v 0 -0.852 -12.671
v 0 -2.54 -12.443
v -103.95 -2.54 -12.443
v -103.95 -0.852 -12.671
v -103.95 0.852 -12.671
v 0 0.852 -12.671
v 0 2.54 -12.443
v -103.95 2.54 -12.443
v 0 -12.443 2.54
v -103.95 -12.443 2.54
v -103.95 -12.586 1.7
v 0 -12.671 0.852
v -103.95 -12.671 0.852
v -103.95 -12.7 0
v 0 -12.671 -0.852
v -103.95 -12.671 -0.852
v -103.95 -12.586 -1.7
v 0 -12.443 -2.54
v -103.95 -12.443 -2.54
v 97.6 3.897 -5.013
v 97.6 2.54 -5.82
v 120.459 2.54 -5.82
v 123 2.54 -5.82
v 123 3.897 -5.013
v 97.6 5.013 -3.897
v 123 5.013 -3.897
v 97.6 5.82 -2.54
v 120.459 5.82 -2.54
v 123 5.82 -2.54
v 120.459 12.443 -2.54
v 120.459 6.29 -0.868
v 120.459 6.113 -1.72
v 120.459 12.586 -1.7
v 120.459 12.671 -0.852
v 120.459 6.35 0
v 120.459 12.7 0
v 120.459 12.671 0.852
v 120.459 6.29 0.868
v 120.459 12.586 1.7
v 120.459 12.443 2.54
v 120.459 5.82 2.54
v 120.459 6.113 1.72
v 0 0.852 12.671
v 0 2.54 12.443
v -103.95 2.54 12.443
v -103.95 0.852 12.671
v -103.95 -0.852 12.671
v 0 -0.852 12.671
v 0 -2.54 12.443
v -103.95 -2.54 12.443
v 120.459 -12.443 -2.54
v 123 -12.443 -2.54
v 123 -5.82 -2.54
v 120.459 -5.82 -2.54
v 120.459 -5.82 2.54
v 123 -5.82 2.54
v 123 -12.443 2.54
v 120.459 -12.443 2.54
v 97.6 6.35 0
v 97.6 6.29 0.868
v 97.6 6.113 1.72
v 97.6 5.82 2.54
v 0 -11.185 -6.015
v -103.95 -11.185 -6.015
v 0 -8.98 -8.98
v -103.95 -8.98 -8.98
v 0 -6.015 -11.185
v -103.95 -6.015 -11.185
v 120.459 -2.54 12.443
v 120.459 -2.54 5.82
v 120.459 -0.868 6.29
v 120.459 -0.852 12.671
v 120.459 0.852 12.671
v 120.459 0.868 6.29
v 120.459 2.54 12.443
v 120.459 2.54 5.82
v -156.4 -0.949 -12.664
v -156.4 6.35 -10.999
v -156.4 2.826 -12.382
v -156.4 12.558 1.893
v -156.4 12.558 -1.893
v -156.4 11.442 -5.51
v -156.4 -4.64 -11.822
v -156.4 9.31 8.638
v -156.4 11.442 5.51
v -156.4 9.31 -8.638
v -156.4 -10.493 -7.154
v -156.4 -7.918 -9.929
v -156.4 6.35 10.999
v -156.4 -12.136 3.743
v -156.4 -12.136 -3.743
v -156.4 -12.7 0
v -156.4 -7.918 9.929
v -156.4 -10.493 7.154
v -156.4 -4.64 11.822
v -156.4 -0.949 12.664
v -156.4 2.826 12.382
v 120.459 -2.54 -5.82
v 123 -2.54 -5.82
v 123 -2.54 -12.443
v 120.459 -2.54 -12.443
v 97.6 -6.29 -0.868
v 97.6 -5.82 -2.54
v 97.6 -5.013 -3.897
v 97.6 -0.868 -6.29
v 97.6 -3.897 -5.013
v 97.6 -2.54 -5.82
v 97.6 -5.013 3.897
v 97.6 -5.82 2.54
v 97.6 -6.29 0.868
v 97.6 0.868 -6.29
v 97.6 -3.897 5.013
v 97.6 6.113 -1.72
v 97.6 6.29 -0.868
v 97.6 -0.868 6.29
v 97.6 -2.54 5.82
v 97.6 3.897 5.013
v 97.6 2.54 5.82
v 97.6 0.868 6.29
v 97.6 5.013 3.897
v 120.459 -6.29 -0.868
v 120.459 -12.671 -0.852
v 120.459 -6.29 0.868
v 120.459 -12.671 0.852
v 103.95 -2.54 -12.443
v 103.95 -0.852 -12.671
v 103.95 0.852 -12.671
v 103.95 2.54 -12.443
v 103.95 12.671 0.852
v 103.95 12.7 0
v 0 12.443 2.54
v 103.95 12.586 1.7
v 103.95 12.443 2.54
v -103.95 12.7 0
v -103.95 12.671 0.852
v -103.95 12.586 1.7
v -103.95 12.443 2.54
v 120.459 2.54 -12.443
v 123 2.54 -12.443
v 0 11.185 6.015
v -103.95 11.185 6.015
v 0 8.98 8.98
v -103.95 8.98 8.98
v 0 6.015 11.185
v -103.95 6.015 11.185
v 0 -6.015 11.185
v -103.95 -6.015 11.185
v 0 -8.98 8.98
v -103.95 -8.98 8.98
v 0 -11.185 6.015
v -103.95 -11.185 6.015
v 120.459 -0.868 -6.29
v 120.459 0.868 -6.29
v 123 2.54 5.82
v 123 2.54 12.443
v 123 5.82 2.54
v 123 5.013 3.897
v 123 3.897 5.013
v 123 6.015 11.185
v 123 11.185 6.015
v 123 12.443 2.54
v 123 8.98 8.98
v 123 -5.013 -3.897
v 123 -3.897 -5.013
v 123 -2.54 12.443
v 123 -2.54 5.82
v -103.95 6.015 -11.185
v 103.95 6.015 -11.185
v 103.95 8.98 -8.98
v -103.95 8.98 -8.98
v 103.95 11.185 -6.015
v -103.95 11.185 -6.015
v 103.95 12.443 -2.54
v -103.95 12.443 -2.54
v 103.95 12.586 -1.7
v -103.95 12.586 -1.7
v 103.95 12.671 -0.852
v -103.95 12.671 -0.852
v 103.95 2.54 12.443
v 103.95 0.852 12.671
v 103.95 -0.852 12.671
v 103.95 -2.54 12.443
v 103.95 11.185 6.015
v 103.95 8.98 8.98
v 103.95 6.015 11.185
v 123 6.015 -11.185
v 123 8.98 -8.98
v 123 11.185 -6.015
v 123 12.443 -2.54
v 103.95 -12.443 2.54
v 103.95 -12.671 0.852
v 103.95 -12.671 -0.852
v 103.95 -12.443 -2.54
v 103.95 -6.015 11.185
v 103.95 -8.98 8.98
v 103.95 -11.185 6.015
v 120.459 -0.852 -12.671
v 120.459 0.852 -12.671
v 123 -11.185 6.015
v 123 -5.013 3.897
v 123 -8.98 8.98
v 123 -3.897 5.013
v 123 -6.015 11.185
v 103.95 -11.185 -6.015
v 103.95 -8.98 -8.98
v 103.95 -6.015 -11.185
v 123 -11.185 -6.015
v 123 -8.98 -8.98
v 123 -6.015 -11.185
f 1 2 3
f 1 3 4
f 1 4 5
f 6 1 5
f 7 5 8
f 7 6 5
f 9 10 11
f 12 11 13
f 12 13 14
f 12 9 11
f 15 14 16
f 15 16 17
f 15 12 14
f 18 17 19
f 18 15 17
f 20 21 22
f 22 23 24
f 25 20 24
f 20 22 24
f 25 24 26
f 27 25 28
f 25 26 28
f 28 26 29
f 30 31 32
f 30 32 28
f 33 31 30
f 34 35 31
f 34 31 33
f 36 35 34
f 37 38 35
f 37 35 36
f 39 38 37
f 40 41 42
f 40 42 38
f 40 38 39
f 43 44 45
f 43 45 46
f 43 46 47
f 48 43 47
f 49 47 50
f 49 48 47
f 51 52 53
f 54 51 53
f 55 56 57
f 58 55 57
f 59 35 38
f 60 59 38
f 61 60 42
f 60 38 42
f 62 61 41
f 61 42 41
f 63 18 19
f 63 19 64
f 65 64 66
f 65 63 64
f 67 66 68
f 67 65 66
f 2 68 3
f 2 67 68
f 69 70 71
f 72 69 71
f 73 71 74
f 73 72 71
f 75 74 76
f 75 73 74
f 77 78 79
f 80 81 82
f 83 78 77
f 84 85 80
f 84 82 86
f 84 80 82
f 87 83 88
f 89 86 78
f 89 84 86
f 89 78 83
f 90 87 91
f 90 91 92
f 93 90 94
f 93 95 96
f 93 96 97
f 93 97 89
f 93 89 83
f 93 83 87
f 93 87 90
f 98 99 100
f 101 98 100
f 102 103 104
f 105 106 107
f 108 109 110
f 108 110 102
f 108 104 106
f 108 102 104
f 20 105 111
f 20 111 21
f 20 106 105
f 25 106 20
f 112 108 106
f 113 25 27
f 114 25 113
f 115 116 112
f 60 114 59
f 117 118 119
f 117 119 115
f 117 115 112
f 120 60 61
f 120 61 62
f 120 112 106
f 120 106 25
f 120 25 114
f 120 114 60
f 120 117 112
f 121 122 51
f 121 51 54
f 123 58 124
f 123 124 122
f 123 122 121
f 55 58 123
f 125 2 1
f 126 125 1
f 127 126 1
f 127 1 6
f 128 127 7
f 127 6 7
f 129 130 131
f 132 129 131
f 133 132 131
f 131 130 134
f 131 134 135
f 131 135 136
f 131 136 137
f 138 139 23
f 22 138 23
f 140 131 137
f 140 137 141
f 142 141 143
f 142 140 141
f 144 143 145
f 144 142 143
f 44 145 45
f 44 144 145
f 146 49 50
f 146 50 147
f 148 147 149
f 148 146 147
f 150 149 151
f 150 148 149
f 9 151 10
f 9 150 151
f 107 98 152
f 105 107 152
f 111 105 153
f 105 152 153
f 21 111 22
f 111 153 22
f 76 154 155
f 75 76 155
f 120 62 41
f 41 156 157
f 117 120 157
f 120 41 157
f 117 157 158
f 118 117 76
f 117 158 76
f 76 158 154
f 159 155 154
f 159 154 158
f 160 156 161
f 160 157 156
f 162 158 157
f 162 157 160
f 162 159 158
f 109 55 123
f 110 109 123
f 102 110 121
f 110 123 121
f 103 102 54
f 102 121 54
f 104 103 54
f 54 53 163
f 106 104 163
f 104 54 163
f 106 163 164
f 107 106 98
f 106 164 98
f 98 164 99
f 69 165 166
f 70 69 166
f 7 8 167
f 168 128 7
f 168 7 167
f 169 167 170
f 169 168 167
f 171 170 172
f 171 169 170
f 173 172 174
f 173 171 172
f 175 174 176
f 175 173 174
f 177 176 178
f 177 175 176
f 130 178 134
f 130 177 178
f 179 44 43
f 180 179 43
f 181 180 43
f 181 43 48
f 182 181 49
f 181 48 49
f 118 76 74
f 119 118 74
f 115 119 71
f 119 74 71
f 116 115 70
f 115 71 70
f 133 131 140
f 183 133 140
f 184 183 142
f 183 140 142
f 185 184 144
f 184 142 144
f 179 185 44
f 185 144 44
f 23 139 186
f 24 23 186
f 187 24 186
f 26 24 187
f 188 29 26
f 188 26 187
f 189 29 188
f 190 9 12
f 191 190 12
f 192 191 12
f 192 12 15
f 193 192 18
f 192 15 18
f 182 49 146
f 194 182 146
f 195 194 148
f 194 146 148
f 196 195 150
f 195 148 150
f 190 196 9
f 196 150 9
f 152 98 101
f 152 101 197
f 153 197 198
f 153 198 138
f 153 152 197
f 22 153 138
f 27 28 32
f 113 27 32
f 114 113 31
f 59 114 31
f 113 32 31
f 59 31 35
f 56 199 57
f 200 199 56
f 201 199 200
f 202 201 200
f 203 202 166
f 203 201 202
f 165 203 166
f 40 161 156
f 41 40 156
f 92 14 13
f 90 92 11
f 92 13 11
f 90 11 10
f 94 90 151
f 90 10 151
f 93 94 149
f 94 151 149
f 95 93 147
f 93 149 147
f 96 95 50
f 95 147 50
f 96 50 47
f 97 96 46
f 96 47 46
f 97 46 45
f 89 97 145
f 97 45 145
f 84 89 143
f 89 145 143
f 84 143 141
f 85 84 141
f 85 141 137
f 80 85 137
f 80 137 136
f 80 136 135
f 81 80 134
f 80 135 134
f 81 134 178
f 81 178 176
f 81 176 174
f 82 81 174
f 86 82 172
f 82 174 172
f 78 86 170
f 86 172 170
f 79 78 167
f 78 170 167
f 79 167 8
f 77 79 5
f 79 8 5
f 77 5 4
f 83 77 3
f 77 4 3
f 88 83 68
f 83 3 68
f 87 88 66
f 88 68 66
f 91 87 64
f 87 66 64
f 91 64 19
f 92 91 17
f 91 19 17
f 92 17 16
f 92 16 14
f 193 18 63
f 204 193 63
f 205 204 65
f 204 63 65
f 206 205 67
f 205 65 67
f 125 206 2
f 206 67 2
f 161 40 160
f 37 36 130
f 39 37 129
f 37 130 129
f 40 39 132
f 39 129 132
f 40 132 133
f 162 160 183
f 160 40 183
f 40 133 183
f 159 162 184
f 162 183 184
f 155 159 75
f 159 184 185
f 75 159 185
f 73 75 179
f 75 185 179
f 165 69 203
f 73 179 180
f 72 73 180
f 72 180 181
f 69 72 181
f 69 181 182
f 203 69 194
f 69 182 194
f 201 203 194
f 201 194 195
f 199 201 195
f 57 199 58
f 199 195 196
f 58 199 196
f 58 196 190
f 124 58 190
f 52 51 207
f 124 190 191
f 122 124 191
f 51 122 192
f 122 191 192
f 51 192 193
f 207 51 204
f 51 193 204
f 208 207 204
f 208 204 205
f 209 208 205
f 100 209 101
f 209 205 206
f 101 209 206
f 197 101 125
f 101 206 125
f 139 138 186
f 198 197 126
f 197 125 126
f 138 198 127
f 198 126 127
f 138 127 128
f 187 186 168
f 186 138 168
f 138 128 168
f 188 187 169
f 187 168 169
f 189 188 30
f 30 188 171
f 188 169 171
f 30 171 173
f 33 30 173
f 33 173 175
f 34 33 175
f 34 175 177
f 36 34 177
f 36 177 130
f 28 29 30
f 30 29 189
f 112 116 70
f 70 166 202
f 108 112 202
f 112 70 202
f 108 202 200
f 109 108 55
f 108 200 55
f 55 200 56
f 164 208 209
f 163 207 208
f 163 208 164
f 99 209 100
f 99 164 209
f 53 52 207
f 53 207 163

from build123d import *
from build123d import SkipClean  # not in build123d's __all__

# Parameters (mm, degrees)
F1_DEPTH  = 103.9495
F3_R      = 12.7
F4_DEPTH  = 19.05
F6_DEPTH  = 25.4
F8_DEPTH  = 2.54
F9_R      = 12.7
F10_DEPTH = 52.451


# Not quite as in the source:
# - after a boolean that leaves OpenCascade's solid faulty, fix() repairs it


with BuildPart() as f1:
    # F0 (on Right) → F1 (new body, symmetric)
    with BuildSketch(Plane.YZ):
        with BuildLine():
            ThreePointArc((12.4434078933, -2.54), (12.6356891432, -1.2764638175), (12.7, 0))
            ThreePointArc((12.7, 0), (12.6356891432, 1.2764638175), (12.4434078933, 2.54))
            Line((12.4434078933, 2.54), (5.8198711326, 2.54))
            ThreePointArc((5.8198711326, 2.54), (6.2160550871, 1.2973662374), (6.35, 0))
            ThreePointArc((6.35, 0), (6.2160550871, -1.2973662374), (5.8198711326, -2.54))
            Line((5.8198711326, -2.54), (12.4434078933, -2.54))
        make_face()
        with BuildLine():
            Line((5.8198711326, 2.54), (12.4434078933, 2.54))
            ThreePointArc((12.4434078933, 2.54), (8.9802561211, 8.9802561211), (2.54, 12.4434078933))
            Line((2.54, 12.4434078933), (2.54, 5.8198711326))
            ThreePointArc((2.54, 5.8198711326), (4.4901280605, 4.4901280605), (5.8198711326, 2.54))
        make_face()
        with BuildLine():
            ThreePointArc((2.54, -12.4434078933), (8.9802561211, -8.9802561211), (12.4434078933, -2.54))
            Line((12.4434078933, -2.54), (5.8198711326, -2.54))
            ThreePointArc((5.8198711326, -2.54), (4.4901280605, -4.4901280605), (2.54, -5.8198711326))
            Line((2.54, -5.8198711326), (2.54, -12.4434078933))
        make_face()
        with BuildLine():
            Line((2.54, 5.8198711326), (2.54, 12.4434078933))
            ThreePointArc((2.54, 12.4434078933), (0, 12.7), (-2.54, 12.4434078933))
            Line((-2.54, 12.4434078933), (-2.54, 5.8198711326))
            ThreePointArc((-2.54, 5.8198711326), (0, 6.35), (2.54, 5.8198711326))
        make_face()
        with BuildLine():
            ThreePointArc((-2.54, -12.4434078933), (0, -12.7), (2.54, -12.4434078933))
            Line((2.54, -12.4434078933), (2.54, -5.8198711326))
            ThreePointArc((2.54, -5.8198711326), (0, -6.35), (-2.54, -5.8198711326))
            Line((-2.54, -5.8198711326), (-2.54, -12.4434078933))
        make_face()
        with BuildLine():
            Line((-2.54, 5.8198711326), (-2.54, 12.4434078933))
            ThreePointArc((-2.54, 12.4434078933), (-8.9802561211, 8.9802561211), (-12.4434078933, 2.54))
            Line((-12.4434078933, 2.54), (-5.8198711326, 2.54))
            ThreePointArc((-5.8198711326, 2.54), (-4.4901280605, 4.4901280605), (-2.54, 5.8198711326))
        make_face()
        with BuildLine():
            ThreePointArc((-12.4434078933, -2.54), (-8.9802561211, -8.9802561211), (-2.54, -12.4434078933))
            Line((-2.54, -12.4434078933), (-2.54, -5.8198711326))
            ThreePointArc((-2.54, -5.8198711326), (-4.4901280605, -4.4901280605), (-5.8198711326, -2.54))
            Line((-5.8198711326, -2.54), (-12.4434078933, -2.54))
        make_face()
        with BuildLine():
            Line((-5.8198711326, 2.54), (-12.4434078933, 2.54))
            ThreePointArc((-12.4434078933, 2.54), (-12.7, 0), (-12.4434078933, -2.54))
            Line((-12.4434078933, -2.54), (-5.8198711326, -2.54))
            ThreePointArc((-5.8198711326, -2.54), (-6.35, 0), (-5.8198711326, 2.54))
        make_face()
        with BuildLine():
            ThreePointArc((6.35, 0), (6.2160550871, 1.2973662374), (5.8198711326, 2.54))
            ThreePointArc((5.8198711326, 2.54), (4.4901280605, 4.4901280605), (2.54, 5.8198711326))
            ThreePointArc((2.54, 5.8198711326), (0, 6.35), (-2.54, 5.8198711326))
            ThreePointArc((-2.54, 5.8198711326), (-4.4901280605, 4.4901280605), (-5.8198711326, 2.54))
            ThreePointArc((-5.8198711326, 2.54), (-6.35, 0), (-5.8198711326, -2.54))
            ThreePointArc((-5.8198711326, -2.54), (-4.4901280605, -4.4901280605), (-2.54, -5.8198711326))
            ThreePointArc((-2.54, -5.8198711326), (0, -6.35), (2.54, -5.8198711326))
            ThreePointArc((2.54, -5.8198711326), (4.4901280605, -4.4901280605), (5.8198711326, -2.54))
            ThreePointArc((5.8198711326, -2.54), (6.2160550871, -1.2973662374), (6.35, 0))
        make_face()
    extrude(amount=F1_DEPTH, both=True)

    # F3 (on face) → F4 (join)
    with BuildSketch(Plane.YZ.offset(103.9495)):
        Circle(F3_R)
    with SkipClean():  # cleaning this boolean's faces spoils the solid; the shape is the same uncleaned
        extrude(amount=F4_DEPTH)

    # F5 (on face) → F6 (cut)
    with BuildSketch(Plane.YZ.offset(122.9995)):
        with BuildLine():
            ThreePointArc((5.8198711326, -2.54), (6.2160550871, -1.2973662374), (6.35, 0))
            ThreePointArc((6.35, 0), (6.2160550871, 1.2973662374), (5.8198711326, 2.54))
            ThreePointArc((5.8198711326, 2.54), (4.4901280605, 4.4901280605), (2.54, 5.8198711326))
            ThreePointArc((2.54, 5.8198711326), (0, 6.35), (-2.54, 5.8198711326))
            ThreePointArc((-2.54, 5.8198711326), (-4.4901280605, 4.4901280605), (-5.8198711326, 2.54))
            ThreePointArc((-5.8198711326, 2.54), (-6.35, 0), (-5.8198711326, -2.54))
            ThreePointArc((-5.8198711326, -2.54), (-4.4901280605, -4.4901280605), (-2.54, -5.8198711326))
            ThreePointArc((-2.54, -5.8198711326), (0, -6.35), (2.54, -5.8198711326))
            ThreePointArc((2.54, -5.8198711326), (4.4901280605, -4.4901280605), (5.8198711326, -2.54))
        make_face()
    extrude(amount=-F6_DEPTH, mode=Mode.SUBTRACT)

    add(f1.part.fix(), mode=Mode.REPLACE)

    # F7 (on face) → F8 (cut)
    with BuildSketch(Plane.YZ.offset(122.9995)):
        with BuildLine():
            ThreePointArc((2.54, 12.4434078933), (0, 12.7), (-2.54, 12.4434078933))
            Line((-2.54, 12.4434078933), (-2.54, 5.8198711326))
            ThreePointArc((-2.54, 5.8198711326), (0, 6.35), (2.54, 5.8198711326))
            Line((2.54, 5.8198711326), (2.54, 12.4434078933))
        make_face()
        with BuildLine():
            ThreePointArc((12.7, 0), (12.6356891432, 1.2764638175), (12.4434078933, 2.54))
            Line((12.4434078933, 2.54), (5.8198711326, 2.54))
            ThreePointArc((5.8198711326, 2.54), (6.2160550871, 1.2973662374), (6.35, 0))
            ThreePointArc((6.35, 0), (6.2160550871, -1.2973662374), (5.8198711326, -2.54))
            Line((5.8198711326, -2.54), (12.4434078933, -2.54))
            ThreePointArc((12.4434078933, -2.54), (12.6356891432, -1.2764638175), (12.7, 0))
        make_face()
        with BuildLine():
            Line((-2.54, -5.8198711326), (-2.54, -12.4434078933))
            ThreePointArc((-2.54, -12.4434078933), (0, -12.7), (2.54, -12.4434078933))
            Line((2.54, -12.4434078933), (2.54, -5.8198711326))
            ThreePointArc((2.54, -5.8198711326), (0, -6.35), (-2.54, -5.8198711326))
        make_face()
        with BuildLine():
            Line((-5.8198711326, 2.54), (-12.4434078933, 2.54))
            ThreePointArc((-12.4434078933, 2.54), (-12.7, 0), (-12.4434078933, -2.54))
            Line((-12.4434078933, -2.54), (-5.8198711326, -2.54))
            ThreePointArc((-5.8198711326, -2.54), (-6.35, 0), (-5.8198711326, 2.54))
        make_face()
    extrude(amount=-F8_DEPTH, mode=Mode.SUBTRACT)

    # F9 (on face) → F10 (join)
    with BuildSketch(Plane(origin=(-103.9495, 0, 0), x_dir=(0, -1, 0), z_dir=(-1, 0, 0))):
        Circle(F9_R)
    with SkipClean():  # cleaning this boolean's faces spoils the solid; the shape is the same uncleaned
        extrude(amount=F10_DEPTH)


solid = f1.part
